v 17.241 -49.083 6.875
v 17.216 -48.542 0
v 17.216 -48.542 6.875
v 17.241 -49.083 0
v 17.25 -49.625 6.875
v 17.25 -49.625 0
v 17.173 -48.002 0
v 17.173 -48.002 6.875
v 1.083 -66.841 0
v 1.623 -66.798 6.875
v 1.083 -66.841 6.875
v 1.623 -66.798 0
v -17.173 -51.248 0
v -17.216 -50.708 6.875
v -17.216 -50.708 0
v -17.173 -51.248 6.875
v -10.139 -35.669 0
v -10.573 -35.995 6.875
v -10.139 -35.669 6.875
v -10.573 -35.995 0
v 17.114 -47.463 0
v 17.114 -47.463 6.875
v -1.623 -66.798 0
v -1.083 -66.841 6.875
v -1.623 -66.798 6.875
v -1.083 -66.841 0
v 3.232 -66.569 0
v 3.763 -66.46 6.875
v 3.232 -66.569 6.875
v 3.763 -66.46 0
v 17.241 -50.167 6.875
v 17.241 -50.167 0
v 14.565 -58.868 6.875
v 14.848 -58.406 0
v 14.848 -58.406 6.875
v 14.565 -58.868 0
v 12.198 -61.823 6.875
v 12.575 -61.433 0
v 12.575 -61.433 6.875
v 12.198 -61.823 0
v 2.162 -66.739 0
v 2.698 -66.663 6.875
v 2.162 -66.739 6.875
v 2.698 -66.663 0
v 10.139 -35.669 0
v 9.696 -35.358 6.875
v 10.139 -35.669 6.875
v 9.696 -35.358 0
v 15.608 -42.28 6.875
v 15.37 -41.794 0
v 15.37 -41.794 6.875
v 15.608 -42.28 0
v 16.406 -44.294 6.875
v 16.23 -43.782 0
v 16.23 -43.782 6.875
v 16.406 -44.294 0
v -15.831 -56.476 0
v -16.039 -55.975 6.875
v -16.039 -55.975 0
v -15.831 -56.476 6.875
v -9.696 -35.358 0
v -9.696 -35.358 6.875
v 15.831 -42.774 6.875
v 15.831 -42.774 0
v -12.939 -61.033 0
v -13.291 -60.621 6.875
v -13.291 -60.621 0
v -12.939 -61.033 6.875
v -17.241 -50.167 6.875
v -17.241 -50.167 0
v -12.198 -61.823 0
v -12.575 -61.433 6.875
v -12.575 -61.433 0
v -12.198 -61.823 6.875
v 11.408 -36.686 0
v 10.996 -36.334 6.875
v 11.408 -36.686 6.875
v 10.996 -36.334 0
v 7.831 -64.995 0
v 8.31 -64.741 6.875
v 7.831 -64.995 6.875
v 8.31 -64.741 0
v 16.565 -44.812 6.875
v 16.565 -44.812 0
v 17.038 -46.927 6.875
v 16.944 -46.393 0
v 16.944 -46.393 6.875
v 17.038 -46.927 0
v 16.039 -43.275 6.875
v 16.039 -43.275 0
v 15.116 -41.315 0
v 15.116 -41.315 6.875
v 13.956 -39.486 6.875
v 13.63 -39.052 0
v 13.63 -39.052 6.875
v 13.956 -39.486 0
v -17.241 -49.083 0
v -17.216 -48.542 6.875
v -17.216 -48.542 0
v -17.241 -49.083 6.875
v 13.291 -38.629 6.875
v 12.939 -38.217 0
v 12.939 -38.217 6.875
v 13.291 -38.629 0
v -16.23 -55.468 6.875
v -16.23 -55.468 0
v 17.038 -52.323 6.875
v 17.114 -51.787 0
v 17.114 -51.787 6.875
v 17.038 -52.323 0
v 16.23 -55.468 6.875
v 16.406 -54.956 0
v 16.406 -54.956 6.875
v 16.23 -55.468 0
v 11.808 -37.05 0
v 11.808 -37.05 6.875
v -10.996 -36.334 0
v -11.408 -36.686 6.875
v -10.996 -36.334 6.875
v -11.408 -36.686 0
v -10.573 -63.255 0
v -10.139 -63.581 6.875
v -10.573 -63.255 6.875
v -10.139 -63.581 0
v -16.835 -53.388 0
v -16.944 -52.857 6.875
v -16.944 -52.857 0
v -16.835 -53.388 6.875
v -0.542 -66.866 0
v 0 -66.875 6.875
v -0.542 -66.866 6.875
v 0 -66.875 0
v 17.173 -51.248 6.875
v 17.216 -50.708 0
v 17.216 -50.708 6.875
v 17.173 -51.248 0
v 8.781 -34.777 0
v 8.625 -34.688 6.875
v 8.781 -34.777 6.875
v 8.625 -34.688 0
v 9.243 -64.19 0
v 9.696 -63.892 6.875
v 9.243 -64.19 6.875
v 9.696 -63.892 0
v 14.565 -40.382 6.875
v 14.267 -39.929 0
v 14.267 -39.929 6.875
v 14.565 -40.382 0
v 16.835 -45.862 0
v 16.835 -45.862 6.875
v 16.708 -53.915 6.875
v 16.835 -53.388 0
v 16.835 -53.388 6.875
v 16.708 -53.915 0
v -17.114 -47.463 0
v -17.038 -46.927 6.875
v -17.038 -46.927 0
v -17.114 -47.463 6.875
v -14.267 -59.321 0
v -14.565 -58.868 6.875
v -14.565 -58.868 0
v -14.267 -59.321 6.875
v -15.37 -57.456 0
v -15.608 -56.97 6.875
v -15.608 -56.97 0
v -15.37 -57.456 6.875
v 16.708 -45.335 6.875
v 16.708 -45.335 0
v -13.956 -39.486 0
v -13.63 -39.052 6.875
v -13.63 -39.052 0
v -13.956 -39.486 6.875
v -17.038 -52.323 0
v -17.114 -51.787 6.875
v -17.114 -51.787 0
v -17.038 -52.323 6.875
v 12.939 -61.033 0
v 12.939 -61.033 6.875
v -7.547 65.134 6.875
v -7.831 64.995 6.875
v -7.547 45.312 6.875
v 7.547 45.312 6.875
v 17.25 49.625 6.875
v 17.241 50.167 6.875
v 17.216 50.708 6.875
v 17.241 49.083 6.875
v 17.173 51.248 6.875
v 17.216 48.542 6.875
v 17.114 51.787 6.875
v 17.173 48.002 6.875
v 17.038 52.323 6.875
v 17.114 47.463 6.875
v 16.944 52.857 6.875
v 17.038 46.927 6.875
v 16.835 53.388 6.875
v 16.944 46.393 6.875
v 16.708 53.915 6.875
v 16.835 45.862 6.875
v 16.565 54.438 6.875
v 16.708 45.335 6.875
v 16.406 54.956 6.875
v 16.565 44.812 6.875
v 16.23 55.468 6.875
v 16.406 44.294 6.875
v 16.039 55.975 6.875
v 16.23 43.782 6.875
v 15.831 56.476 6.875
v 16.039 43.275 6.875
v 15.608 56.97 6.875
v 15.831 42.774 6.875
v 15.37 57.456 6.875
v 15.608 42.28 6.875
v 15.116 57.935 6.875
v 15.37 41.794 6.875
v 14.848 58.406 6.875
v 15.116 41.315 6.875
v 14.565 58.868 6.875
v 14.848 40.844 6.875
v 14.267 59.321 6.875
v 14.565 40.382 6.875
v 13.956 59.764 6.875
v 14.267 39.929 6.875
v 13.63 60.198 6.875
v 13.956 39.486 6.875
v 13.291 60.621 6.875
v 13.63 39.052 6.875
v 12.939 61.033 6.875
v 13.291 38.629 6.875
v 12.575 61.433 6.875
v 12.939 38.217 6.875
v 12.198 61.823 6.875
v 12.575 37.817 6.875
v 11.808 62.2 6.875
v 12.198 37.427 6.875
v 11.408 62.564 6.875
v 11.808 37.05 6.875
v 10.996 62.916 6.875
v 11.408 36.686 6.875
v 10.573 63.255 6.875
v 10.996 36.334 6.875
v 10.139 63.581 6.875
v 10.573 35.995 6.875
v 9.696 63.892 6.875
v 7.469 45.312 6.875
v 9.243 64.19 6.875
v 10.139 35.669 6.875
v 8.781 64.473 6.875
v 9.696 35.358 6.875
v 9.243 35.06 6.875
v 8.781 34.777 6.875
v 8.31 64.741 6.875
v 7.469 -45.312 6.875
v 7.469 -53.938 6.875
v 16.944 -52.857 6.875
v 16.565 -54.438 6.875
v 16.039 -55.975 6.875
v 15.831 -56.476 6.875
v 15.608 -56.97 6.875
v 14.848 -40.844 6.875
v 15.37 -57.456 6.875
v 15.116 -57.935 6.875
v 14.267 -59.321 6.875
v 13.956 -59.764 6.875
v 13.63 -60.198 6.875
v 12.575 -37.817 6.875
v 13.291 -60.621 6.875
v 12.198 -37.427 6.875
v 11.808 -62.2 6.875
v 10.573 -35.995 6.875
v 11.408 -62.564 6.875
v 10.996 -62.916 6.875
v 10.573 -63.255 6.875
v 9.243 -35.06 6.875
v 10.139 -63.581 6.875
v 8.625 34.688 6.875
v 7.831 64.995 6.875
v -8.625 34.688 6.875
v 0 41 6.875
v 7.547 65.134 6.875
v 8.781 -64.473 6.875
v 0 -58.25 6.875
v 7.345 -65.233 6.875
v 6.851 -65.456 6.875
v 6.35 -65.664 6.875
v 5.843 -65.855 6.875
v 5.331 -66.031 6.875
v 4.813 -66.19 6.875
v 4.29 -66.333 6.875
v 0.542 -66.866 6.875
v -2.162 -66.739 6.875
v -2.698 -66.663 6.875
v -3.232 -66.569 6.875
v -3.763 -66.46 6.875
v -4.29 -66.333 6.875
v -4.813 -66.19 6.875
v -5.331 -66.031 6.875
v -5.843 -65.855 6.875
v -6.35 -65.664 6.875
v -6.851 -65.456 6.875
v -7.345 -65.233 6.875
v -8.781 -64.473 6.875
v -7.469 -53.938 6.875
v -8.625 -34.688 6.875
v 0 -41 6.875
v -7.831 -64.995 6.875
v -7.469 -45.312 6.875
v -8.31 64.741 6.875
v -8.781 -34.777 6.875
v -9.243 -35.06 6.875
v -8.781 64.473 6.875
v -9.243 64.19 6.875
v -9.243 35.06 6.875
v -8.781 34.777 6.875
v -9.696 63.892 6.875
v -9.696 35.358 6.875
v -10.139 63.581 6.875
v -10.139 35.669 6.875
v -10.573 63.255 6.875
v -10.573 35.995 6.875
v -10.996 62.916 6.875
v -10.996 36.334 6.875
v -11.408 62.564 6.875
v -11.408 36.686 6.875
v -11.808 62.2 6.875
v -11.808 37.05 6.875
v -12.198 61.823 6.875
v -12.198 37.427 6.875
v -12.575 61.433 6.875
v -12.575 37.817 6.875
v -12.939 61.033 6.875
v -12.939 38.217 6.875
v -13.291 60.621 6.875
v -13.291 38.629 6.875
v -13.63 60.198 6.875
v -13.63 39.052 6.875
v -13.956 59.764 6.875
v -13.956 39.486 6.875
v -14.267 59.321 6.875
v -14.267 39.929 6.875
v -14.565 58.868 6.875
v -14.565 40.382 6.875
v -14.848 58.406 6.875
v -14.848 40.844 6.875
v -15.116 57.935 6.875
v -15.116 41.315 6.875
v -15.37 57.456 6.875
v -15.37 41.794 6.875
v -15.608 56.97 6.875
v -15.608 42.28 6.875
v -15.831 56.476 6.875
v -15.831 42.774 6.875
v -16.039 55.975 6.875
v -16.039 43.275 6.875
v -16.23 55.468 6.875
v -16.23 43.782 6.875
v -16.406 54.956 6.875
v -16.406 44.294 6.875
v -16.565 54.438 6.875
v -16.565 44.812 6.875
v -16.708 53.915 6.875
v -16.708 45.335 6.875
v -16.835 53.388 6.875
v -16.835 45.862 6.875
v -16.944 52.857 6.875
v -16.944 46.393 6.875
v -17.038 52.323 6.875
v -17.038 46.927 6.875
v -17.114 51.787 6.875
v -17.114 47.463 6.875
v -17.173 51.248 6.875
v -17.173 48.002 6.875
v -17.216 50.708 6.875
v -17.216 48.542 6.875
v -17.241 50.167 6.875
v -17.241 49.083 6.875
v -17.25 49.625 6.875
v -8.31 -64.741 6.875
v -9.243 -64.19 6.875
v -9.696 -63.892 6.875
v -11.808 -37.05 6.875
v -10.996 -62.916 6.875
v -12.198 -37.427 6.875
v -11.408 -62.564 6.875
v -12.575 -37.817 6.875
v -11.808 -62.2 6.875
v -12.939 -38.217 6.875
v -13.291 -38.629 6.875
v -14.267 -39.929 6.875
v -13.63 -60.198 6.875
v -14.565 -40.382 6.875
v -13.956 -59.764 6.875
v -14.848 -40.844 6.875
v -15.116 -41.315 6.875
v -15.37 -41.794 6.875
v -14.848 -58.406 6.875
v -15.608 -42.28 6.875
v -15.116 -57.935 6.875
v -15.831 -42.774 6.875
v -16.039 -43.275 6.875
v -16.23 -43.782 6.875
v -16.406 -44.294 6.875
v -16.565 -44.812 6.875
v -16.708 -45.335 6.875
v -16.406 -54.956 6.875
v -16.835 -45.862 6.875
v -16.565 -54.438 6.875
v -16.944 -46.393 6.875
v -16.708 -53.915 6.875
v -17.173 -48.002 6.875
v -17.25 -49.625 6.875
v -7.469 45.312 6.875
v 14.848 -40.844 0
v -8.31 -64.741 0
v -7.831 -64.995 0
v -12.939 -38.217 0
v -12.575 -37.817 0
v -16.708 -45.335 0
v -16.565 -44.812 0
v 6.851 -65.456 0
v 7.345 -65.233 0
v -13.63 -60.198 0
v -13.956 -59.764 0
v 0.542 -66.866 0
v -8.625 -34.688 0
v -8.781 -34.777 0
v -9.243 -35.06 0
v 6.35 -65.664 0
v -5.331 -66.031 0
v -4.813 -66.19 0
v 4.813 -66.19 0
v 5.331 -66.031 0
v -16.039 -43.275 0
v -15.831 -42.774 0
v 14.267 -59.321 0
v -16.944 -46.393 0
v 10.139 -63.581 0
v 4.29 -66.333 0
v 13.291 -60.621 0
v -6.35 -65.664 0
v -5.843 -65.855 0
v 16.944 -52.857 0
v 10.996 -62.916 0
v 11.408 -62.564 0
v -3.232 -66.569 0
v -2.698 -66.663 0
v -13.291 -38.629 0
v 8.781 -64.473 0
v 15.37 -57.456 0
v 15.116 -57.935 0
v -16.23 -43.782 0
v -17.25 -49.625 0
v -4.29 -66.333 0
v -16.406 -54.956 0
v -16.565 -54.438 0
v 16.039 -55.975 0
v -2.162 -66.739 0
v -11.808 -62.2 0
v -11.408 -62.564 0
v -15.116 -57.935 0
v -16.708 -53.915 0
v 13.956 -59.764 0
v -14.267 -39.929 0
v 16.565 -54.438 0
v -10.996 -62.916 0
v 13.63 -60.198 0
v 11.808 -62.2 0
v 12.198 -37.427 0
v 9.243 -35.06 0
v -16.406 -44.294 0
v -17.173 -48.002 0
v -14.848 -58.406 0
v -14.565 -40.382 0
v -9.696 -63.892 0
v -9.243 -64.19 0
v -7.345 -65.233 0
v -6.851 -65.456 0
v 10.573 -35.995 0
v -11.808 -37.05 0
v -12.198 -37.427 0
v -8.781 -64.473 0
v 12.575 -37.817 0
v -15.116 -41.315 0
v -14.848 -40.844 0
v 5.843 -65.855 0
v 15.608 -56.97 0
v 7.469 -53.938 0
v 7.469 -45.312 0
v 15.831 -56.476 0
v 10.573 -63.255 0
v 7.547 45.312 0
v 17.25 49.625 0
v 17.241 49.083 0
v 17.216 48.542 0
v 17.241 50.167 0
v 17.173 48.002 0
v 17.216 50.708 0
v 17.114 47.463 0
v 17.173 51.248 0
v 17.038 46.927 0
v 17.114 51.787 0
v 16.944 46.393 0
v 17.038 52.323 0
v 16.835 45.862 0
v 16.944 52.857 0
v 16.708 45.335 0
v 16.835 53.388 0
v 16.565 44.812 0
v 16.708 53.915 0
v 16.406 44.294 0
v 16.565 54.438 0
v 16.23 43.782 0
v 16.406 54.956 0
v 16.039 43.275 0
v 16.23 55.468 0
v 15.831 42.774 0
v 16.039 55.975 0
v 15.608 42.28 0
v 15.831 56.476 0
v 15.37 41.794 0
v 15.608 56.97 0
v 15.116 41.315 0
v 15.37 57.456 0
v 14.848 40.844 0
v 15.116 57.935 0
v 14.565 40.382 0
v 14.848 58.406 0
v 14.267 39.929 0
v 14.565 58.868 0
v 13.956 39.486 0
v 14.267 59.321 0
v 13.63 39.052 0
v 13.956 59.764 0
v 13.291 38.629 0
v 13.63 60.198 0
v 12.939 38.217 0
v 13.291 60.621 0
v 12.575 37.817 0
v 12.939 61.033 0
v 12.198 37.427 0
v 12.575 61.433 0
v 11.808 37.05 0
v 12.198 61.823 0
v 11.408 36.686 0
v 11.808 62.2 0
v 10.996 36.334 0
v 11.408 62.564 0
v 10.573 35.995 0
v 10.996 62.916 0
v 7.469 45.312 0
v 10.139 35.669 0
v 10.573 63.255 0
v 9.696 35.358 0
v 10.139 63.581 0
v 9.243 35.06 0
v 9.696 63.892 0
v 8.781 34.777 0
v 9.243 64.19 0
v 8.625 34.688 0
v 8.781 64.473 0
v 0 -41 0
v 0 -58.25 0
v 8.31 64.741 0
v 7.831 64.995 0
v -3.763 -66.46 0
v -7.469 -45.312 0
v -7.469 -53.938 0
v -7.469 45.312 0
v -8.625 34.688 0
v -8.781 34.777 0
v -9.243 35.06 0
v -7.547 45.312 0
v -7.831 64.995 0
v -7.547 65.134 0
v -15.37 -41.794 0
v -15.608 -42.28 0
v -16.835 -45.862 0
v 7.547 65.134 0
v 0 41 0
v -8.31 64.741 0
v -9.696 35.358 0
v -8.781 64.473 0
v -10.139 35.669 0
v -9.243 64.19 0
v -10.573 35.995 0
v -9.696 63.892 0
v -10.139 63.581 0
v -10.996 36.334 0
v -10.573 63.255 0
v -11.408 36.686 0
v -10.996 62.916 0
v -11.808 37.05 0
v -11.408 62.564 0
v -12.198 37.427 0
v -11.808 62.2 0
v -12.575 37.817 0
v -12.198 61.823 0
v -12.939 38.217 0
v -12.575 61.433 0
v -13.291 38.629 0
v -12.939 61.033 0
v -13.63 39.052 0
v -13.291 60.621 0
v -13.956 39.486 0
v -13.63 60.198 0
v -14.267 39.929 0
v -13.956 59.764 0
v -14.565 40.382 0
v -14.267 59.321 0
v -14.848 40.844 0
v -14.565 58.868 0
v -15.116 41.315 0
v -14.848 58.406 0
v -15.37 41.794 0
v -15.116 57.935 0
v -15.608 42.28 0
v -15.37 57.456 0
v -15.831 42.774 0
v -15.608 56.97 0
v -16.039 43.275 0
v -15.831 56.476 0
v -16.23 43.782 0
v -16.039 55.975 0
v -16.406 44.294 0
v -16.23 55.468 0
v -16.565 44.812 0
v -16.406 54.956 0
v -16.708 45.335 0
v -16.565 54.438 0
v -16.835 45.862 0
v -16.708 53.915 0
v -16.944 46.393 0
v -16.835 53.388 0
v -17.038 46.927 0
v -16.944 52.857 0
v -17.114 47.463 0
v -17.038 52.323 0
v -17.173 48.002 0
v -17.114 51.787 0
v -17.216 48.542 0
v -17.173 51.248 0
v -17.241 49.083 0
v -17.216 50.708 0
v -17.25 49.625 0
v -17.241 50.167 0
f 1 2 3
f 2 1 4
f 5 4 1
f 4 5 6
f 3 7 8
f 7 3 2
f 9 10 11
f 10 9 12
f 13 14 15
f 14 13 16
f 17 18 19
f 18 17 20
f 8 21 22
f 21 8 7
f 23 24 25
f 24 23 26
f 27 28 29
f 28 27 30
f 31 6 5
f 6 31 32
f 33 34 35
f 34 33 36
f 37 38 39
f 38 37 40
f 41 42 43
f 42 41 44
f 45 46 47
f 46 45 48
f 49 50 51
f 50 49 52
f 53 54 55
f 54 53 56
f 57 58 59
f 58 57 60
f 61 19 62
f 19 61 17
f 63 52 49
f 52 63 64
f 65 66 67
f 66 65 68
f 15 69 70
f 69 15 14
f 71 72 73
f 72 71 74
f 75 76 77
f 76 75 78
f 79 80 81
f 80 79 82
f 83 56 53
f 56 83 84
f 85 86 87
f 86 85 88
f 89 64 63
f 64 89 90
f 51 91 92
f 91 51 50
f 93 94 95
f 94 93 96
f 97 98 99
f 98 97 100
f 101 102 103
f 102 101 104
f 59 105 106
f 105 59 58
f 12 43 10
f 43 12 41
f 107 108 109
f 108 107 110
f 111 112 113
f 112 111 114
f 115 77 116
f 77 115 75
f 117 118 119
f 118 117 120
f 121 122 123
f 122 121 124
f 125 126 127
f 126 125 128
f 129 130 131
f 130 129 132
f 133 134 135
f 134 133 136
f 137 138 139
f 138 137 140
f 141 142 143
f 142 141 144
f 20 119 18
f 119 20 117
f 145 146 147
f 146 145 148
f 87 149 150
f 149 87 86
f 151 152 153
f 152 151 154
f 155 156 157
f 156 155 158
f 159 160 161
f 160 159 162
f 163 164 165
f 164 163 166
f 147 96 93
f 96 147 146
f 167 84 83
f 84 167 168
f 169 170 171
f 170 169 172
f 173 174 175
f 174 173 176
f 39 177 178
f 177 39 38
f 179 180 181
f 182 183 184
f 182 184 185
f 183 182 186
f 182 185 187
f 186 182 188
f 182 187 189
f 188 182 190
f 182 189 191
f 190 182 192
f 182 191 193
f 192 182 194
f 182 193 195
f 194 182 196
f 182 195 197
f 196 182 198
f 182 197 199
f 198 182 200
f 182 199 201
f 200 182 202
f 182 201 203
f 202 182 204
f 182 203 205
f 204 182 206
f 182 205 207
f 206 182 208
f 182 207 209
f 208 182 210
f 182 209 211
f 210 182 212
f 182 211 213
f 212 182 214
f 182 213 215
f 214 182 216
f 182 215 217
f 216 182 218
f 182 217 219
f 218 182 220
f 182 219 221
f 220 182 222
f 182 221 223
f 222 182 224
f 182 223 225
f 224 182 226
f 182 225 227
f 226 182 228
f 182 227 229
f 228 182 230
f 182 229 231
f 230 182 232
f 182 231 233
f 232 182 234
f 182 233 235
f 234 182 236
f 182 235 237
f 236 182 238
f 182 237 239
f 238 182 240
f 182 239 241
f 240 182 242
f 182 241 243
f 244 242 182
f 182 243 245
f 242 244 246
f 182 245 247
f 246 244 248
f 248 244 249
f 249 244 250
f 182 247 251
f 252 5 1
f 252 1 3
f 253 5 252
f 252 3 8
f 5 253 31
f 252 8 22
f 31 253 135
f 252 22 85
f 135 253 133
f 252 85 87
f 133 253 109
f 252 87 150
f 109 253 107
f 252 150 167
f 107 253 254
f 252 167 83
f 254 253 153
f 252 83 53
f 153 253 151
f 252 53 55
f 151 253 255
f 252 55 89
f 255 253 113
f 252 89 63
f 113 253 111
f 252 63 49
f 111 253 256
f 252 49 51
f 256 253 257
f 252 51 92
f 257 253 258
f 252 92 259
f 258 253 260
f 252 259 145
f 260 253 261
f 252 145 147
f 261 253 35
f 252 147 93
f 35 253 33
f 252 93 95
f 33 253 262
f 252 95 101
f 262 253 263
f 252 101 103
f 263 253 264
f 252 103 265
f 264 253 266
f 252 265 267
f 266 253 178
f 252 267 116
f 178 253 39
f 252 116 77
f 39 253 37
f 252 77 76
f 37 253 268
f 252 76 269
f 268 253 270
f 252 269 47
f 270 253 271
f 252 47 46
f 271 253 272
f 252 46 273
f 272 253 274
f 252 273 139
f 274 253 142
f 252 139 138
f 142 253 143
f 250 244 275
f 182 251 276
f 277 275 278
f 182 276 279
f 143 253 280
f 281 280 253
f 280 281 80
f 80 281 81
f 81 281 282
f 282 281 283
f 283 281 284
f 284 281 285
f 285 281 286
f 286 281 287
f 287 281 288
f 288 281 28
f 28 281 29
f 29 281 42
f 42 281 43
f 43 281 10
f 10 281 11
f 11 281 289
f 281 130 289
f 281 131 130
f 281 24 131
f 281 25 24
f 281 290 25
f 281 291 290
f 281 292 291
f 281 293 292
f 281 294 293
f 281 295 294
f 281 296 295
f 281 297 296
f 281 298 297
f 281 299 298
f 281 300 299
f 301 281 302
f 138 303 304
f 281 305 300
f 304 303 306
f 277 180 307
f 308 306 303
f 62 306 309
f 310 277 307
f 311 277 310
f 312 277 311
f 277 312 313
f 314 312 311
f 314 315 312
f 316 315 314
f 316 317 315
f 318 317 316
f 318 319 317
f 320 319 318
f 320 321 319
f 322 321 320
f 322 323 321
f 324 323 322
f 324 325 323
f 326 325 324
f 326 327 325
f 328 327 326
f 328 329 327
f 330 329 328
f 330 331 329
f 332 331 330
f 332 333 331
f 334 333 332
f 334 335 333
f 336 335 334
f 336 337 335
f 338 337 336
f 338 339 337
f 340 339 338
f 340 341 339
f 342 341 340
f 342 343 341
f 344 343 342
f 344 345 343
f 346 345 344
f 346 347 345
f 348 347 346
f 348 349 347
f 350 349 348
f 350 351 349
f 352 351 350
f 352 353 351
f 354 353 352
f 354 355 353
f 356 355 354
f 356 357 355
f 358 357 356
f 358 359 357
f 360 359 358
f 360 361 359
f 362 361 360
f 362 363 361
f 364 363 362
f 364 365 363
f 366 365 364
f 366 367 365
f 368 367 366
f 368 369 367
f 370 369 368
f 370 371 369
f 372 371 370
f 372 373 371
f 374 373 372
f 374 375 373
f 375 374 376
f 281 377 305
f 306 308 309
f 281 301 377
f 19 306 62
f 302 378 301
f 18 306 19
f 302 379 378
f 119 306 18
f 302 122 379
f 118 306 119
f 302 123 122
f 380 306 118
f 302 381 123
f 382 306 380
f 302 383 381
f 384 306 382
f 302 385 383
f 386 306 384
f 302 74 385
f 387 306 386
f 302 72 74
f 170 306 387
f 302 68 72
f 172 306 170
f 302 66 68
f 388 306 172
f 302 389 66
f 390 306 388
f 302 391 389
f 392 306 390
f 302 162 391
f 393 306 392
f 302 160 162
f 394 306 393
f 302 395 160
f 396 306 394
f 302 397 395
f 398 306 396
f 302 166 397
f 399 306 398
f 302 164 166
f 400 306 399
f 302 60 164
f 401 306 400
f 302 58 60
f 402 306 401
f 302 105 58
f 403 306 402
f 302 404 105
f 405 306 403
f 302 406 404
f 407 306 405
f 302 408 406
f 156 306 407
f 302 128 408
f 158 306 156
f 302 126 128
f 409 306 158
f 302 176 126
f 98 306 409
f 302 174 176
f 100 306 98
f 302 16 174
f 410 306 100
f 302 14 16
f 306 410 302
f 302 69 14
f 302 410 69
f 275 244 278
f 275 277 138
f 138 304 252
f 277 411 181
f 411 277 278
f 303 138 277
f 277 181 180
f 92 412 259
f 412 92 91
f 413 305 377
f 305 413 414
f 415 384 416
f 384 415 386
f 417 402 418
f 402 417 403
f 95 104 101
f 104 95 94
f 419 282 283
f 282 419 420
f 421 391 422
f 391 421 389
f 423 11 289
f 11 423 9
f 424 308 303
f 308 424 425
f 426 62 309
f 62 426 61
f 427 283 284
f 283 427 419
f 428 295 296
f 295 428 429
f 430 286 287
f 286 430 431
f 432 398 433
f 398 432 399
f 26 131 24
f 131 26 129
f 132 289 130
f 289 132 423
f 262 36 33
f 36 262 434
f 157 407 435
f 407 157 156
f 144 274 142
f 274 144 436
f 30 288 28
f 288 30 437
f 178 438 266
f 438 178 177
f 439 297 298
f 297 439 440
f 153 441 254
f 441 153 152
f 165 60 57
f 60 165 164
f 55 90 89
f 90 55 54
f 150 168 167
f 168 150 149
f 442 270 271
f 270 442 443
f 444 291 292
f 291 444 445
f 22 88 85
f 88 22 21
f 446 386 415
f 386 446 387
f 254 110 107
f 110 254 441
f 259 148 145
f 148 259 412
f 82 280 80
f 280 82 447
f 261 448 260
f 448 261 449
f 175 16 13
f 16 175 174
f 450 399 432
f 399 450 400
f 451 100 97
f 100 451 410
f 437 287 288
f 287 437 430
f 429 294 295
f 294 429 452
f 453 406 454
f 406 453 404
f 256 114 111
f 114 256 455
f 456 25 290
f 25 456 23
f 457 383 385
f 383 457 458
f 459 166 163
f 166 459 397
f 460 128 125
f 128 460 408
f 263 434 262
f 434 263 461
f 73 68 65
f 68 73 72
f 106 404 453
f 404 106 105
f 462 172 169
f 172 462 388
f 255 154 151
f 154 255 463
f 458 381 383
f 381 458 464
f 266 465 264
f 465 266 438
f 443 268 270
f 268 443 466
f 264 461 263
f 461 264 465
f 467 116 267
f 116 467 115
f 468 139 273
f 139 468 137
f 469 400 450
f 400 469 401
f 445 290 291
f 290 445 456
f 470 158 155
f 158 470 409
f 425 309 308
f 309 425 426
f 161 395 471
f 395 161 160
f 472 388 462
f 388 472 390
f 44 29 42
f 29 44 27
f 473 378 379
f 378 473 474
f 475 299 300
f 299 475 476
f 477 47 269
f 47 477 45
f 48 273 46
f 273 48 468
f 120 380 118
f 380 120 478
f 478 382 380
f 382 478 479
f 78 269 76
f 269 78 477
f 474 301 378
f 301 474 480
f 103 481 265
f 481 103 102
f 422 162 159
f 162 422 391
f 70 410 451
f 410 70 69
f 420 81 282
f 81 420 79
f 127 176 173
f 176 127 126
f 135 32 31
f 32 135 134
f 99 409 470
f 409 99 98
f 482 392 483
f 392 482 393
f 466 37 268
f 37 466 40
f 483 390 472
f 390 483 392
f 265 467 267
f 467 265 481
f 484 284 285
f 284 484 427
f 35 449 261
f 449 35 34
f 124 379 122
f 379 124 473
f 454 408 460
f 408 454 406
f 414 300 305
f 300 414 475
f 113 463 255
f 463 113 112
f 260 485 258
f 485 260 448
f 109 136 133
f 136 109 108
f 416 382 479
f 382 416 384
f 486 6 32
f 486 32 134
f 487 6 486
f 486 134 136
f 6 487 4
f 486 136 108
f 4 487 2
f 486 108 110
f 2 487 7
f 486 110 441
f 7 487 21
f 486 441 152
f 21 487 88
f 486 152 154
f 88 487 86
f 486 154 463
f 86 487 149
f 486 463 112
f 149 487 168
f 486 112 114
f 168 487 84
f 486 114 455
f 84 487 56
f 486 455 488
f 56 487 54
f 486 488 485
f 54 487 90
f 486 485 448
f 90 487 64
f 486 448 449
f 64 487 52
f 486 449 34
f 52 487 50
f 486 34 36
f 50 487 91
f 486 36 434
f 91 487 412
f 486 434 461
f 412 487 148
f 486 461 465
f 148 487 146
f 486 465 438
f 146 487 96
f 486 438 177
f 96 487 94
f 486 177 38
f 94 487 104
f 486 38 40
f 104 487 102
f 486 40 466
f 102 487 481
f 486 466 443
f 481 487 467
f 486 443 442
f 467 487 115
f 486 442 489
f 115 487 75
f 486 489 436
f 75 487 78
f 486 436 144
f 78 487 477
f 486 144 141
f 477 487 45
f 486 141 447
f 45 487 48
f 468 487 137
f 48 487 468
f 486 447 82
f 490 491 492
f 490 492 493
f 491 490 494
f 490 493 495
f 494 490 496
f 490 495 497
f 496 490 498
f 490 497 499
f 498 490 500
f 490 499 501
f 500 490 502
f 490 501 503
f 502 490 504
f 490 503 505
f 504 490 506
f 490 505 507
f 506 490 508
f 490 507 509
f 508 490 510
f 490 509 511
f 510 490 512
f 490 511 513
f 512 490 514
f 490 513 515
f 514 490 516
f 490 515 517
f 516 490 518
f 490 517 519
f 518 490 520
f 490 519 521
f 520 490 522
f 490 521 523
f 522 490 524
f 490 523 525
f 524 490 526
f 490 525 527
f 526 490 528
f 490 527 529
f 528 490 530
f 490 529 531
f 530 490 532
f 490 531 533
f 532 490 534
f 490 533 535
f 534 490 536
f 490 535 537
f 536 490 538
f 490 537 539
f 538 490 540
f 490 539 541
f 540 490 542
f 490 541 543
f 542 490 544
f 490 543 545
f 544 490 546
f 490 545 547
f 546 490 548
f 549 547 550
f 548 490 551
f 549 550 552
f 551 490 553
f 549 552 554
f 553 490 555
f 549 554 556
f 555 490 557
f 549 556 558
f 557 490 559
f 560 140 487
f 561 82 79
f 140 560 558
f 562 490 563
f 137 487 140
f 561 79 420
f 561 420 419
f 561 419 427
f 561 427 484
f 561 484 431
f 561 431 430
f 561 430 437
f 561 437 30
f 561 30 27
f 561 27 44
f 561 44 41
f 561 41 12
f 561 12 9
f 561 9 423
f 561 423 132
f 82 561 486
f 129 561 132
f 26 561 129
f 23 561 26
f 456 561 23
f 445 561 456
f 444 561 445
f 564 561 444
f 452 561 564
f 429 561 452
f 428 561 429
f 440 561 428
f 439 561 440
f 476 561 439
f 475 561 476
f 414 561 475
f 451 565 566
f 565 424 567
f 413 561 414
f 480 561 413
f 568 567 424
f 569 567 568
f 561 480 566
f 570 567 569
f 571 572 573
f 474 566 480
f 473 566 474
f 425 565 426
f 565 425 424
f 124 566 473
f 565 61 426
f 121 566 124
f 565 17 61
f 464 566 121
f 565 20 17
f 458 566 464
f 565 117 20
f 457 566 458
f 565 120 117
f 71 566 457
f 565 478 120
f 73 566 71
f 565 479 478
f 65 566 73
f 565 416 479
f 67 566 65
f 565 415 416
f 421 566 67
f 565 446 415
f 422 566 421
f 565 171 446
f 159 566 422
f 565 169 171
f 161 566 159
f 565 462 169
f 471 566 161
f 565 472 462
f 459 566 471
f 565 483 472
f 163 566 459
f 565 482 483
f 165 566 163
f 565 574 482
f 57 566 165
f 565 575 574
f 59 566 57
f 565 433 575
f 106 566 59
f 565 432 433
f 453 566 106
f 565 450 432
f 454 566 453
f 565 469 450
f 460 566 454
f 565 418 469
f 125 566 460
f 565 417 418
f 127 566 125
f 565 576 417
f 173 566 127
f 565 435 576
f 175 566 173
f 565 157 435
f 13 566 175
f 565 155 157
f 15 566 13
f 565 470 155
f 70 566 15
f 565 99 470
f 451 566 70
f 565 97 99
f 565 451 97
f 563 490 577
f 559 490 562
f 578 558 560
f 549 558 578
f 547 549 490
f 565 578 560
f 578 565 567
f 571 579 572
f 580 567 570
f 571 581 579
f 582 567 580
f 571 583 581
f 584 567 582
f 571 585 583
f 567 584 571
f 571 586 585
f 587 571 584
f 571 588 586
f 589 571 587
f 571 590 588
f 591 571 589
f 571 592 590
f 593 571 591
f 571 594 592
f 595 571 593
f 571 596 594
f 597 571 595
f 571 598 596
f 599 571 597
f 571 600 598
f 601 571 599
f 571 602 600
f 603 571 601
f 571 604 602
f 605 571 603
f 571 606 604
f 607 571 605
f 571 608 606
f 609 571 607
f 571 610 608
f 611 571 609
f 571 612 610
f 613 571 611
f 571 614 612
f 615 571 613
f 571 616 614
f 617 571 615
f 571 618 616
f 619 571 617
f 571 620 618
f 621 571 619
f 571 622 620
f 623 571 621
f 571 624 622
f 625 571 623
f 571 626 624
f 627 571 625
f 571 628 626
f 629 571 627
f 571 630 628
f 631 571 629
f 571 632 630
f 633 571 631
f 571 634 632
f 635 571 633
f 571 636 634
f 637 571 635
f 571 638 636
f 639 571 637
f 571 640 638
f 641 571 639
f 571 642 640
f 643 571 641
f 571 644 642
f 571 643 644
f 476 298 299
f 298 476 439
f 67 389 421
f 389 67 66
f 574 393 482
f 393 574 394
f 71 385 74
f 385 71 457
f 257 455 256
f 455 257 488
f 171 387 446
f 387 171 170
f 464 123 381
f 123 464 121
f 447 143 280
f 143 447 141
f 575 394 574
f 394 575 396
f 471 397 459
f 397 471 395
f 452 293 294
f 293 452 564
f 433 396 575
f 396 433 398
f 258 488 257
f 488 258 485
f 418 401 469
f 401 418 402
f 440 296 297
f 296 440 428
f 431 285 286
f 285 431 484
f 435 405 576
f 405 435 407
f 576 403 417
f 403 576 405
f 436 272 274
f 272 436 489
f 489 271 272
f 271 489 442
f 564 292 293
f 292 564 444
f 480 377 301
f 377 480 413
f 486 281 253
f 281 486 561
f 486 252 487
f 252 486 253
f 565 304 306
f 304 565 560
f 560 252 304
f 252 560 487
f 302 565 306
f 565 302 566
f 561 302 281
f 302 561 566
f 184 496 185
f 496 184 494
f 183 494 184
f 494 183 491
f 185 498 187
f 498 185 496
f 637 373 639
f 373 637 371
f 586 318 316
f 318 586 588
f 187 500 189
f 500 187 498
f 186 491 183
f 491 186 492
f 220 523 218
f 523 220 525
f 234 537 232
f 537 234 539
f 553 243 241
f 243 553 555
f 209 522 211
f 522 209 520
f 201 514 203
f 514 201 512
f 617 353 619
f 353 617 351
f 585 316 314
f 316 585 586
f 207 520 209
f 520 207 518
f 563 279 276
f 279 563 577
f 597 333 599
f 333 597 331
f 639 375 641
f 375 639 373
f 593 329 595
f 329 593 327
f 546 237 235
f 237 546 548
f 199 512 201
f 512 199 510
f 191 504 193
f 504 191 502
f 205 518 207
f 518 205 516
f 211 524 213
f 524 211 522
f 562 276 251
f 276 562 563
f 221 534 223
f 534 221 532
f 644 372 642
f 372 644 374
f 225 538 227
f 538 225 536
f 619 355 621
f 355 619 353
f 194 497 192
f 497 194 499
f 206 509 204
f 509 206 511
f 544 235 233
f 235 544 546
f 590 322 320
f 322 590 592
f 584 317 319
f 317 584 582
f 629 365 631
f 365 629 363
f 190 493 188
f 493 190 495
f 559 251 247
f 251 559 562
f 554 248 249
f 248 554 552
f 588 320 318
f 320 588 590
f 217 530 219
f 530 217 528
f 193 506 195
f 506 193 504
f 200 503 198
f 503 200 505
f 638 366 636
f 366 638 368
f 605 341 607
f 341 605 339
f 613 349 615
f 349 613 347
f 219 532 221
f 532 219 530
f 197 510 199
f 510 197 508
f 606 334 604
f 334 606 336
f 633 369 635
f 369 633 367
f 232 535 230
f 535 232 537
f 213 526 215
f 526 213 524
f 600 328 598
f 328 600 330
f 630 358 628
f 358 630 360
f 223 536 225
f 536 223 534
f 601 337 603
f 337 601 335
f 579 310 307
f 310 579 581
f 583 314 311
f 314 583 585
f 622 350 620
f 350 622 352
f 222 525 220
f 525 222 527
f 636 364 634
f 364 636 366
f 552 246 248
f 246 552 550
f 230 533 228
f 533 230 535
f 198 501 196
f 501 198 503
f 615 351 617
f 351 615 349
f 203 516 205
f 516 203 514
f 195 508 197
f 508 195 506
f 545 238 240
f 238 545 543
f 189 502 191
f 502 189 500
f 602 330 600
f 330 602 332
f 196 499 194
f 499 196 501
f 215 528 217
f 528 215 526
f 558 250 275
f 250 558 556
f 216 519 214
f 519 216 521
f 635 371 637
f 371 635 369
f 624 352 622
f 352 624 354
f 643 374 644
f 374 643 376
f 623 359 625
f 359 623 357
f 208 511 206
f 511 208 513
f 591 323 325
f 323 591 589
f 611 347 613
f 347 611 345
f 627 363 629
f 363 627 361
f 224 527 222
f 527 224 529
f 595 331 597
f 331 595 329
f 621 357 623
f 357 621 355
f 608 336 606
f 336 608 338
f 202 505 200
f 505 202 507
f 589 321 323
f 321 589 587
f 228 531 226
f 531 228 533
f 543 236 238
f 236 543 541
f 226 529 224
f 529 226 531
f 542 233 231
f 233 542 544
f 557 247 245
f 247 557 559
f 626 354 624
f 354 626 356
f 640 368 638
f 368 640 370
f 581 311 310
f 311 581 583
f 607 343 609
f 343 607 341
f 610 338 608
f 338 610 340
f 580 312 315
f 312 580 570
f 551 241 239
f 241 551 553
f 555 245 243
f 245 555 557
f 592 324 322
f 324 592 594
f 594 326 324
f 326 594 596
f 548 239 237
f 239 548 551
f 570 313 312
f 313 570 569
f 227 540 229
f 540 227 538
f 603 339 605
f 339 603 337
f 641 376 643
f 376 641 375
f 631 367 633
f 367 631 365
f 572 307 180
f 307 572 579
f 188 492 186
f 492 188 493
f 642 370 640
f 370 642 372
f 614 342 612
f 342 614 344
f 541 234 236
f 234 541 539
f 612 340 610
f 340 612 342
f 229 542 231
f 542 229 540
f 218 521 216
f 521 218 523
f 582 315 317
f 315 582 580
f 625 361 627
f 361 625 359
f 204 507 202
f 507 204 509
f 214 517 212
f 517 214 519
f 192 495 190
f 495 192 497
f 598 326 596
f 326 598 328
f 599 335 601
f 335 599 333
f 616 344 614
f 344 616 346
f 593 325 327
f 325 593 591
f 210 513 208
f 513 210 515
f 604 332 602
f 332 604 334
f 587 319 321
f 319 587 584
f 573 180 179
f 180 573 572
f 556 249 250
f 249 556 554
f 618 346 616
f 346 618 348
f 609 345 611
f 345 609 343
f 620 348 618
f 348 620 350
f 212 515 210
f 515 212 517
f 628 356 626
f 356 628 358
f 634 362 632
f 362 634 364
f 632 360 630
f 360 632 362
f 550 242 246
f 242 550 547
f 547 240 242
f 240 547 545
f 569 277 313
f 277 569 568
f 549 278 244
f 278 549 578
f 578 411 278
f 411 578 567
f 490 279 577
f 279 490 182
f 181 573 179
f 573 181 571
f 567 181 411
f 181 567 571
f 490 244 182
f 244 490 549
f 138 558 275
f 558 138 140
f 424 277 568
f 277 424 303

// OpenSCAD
$fn = 200;					// So the cylinders are smooth

// ================ Wrent Configuration Parameters ================ 
nut_diameter                = 17 + 0.25; // Most seem to have .25 slack in them
nut_thickness               = 6.25;
wrench_handle_length        = 82;
wrench_nut_overlap_percent  = 0.10; // "extra" to grip the nut
// =================================================================


// Calculate some nice values
wrench_thickness = (1+wrench_nut_overlap_percent) * nut_thickness; 

// Something to make wrench heads for us
module wrench_head(thickness, nut_d, head_extra, open_ended) 
{
	difference() 
    {
        // Main "head" shape that we will subtract from to get the closed
        // or open ended ends.
        translate([0, 0, -thickness / 2]) 
        {
			cylinder(h = thickness, r = (nut_d + head_extra) / 2);
		}

        // Hex nuts go in at a 30 degree angle
		rotate(30) 
        {
			hexagon(nut_d, thickness*1.01); // 1% fudge factor for rendering the subtraction
		}

        // Move to cender of the nut, and subtract the end box for open ended
        if(open_ended)
        {
            translate([0, nut_d / 2, 0]) 
            {
                // Create box, removing head extra/8th to account for nut shape
                box(nut_d-(head_extra/8), nut_d + head_extra / 2, thickness * 1.01);// 1% fudge factor for rendering the subtraction
			}
		}
	}
}

// Put us flat on the bed
translate([0, 0, wrench_thickness / 2]) 
{
	// The handle
	box(nut_diameter, wrench_handle_length, wrench_thickness);

	// Make the closed head
	translate([0, -((wrench_handle_length + nut_diameter) / 2), 0]) 
    {
		wrench_head(wrench_thickness, nut_diameter, nut_diameter, false);
	}

	// And the open head
	translate([0, (wrench_handle_length + nut_diameter) / 2, 0]) 
    {
		wrench_head(wrench_thickness, nut_diameter, nut_diameter, true);
	}
}

module hexagon(diameter, thickness) 
{
    // Just a cylinder with a resolution of 6 (ie 6 sides)
    cylinder(r = diameter / 2, h = thickness, $fn = 6, center = true);
}

module box(b_width, b_length, b_thick) 
{
    cube([b_width, b_length, b_thick], center = true);
}
